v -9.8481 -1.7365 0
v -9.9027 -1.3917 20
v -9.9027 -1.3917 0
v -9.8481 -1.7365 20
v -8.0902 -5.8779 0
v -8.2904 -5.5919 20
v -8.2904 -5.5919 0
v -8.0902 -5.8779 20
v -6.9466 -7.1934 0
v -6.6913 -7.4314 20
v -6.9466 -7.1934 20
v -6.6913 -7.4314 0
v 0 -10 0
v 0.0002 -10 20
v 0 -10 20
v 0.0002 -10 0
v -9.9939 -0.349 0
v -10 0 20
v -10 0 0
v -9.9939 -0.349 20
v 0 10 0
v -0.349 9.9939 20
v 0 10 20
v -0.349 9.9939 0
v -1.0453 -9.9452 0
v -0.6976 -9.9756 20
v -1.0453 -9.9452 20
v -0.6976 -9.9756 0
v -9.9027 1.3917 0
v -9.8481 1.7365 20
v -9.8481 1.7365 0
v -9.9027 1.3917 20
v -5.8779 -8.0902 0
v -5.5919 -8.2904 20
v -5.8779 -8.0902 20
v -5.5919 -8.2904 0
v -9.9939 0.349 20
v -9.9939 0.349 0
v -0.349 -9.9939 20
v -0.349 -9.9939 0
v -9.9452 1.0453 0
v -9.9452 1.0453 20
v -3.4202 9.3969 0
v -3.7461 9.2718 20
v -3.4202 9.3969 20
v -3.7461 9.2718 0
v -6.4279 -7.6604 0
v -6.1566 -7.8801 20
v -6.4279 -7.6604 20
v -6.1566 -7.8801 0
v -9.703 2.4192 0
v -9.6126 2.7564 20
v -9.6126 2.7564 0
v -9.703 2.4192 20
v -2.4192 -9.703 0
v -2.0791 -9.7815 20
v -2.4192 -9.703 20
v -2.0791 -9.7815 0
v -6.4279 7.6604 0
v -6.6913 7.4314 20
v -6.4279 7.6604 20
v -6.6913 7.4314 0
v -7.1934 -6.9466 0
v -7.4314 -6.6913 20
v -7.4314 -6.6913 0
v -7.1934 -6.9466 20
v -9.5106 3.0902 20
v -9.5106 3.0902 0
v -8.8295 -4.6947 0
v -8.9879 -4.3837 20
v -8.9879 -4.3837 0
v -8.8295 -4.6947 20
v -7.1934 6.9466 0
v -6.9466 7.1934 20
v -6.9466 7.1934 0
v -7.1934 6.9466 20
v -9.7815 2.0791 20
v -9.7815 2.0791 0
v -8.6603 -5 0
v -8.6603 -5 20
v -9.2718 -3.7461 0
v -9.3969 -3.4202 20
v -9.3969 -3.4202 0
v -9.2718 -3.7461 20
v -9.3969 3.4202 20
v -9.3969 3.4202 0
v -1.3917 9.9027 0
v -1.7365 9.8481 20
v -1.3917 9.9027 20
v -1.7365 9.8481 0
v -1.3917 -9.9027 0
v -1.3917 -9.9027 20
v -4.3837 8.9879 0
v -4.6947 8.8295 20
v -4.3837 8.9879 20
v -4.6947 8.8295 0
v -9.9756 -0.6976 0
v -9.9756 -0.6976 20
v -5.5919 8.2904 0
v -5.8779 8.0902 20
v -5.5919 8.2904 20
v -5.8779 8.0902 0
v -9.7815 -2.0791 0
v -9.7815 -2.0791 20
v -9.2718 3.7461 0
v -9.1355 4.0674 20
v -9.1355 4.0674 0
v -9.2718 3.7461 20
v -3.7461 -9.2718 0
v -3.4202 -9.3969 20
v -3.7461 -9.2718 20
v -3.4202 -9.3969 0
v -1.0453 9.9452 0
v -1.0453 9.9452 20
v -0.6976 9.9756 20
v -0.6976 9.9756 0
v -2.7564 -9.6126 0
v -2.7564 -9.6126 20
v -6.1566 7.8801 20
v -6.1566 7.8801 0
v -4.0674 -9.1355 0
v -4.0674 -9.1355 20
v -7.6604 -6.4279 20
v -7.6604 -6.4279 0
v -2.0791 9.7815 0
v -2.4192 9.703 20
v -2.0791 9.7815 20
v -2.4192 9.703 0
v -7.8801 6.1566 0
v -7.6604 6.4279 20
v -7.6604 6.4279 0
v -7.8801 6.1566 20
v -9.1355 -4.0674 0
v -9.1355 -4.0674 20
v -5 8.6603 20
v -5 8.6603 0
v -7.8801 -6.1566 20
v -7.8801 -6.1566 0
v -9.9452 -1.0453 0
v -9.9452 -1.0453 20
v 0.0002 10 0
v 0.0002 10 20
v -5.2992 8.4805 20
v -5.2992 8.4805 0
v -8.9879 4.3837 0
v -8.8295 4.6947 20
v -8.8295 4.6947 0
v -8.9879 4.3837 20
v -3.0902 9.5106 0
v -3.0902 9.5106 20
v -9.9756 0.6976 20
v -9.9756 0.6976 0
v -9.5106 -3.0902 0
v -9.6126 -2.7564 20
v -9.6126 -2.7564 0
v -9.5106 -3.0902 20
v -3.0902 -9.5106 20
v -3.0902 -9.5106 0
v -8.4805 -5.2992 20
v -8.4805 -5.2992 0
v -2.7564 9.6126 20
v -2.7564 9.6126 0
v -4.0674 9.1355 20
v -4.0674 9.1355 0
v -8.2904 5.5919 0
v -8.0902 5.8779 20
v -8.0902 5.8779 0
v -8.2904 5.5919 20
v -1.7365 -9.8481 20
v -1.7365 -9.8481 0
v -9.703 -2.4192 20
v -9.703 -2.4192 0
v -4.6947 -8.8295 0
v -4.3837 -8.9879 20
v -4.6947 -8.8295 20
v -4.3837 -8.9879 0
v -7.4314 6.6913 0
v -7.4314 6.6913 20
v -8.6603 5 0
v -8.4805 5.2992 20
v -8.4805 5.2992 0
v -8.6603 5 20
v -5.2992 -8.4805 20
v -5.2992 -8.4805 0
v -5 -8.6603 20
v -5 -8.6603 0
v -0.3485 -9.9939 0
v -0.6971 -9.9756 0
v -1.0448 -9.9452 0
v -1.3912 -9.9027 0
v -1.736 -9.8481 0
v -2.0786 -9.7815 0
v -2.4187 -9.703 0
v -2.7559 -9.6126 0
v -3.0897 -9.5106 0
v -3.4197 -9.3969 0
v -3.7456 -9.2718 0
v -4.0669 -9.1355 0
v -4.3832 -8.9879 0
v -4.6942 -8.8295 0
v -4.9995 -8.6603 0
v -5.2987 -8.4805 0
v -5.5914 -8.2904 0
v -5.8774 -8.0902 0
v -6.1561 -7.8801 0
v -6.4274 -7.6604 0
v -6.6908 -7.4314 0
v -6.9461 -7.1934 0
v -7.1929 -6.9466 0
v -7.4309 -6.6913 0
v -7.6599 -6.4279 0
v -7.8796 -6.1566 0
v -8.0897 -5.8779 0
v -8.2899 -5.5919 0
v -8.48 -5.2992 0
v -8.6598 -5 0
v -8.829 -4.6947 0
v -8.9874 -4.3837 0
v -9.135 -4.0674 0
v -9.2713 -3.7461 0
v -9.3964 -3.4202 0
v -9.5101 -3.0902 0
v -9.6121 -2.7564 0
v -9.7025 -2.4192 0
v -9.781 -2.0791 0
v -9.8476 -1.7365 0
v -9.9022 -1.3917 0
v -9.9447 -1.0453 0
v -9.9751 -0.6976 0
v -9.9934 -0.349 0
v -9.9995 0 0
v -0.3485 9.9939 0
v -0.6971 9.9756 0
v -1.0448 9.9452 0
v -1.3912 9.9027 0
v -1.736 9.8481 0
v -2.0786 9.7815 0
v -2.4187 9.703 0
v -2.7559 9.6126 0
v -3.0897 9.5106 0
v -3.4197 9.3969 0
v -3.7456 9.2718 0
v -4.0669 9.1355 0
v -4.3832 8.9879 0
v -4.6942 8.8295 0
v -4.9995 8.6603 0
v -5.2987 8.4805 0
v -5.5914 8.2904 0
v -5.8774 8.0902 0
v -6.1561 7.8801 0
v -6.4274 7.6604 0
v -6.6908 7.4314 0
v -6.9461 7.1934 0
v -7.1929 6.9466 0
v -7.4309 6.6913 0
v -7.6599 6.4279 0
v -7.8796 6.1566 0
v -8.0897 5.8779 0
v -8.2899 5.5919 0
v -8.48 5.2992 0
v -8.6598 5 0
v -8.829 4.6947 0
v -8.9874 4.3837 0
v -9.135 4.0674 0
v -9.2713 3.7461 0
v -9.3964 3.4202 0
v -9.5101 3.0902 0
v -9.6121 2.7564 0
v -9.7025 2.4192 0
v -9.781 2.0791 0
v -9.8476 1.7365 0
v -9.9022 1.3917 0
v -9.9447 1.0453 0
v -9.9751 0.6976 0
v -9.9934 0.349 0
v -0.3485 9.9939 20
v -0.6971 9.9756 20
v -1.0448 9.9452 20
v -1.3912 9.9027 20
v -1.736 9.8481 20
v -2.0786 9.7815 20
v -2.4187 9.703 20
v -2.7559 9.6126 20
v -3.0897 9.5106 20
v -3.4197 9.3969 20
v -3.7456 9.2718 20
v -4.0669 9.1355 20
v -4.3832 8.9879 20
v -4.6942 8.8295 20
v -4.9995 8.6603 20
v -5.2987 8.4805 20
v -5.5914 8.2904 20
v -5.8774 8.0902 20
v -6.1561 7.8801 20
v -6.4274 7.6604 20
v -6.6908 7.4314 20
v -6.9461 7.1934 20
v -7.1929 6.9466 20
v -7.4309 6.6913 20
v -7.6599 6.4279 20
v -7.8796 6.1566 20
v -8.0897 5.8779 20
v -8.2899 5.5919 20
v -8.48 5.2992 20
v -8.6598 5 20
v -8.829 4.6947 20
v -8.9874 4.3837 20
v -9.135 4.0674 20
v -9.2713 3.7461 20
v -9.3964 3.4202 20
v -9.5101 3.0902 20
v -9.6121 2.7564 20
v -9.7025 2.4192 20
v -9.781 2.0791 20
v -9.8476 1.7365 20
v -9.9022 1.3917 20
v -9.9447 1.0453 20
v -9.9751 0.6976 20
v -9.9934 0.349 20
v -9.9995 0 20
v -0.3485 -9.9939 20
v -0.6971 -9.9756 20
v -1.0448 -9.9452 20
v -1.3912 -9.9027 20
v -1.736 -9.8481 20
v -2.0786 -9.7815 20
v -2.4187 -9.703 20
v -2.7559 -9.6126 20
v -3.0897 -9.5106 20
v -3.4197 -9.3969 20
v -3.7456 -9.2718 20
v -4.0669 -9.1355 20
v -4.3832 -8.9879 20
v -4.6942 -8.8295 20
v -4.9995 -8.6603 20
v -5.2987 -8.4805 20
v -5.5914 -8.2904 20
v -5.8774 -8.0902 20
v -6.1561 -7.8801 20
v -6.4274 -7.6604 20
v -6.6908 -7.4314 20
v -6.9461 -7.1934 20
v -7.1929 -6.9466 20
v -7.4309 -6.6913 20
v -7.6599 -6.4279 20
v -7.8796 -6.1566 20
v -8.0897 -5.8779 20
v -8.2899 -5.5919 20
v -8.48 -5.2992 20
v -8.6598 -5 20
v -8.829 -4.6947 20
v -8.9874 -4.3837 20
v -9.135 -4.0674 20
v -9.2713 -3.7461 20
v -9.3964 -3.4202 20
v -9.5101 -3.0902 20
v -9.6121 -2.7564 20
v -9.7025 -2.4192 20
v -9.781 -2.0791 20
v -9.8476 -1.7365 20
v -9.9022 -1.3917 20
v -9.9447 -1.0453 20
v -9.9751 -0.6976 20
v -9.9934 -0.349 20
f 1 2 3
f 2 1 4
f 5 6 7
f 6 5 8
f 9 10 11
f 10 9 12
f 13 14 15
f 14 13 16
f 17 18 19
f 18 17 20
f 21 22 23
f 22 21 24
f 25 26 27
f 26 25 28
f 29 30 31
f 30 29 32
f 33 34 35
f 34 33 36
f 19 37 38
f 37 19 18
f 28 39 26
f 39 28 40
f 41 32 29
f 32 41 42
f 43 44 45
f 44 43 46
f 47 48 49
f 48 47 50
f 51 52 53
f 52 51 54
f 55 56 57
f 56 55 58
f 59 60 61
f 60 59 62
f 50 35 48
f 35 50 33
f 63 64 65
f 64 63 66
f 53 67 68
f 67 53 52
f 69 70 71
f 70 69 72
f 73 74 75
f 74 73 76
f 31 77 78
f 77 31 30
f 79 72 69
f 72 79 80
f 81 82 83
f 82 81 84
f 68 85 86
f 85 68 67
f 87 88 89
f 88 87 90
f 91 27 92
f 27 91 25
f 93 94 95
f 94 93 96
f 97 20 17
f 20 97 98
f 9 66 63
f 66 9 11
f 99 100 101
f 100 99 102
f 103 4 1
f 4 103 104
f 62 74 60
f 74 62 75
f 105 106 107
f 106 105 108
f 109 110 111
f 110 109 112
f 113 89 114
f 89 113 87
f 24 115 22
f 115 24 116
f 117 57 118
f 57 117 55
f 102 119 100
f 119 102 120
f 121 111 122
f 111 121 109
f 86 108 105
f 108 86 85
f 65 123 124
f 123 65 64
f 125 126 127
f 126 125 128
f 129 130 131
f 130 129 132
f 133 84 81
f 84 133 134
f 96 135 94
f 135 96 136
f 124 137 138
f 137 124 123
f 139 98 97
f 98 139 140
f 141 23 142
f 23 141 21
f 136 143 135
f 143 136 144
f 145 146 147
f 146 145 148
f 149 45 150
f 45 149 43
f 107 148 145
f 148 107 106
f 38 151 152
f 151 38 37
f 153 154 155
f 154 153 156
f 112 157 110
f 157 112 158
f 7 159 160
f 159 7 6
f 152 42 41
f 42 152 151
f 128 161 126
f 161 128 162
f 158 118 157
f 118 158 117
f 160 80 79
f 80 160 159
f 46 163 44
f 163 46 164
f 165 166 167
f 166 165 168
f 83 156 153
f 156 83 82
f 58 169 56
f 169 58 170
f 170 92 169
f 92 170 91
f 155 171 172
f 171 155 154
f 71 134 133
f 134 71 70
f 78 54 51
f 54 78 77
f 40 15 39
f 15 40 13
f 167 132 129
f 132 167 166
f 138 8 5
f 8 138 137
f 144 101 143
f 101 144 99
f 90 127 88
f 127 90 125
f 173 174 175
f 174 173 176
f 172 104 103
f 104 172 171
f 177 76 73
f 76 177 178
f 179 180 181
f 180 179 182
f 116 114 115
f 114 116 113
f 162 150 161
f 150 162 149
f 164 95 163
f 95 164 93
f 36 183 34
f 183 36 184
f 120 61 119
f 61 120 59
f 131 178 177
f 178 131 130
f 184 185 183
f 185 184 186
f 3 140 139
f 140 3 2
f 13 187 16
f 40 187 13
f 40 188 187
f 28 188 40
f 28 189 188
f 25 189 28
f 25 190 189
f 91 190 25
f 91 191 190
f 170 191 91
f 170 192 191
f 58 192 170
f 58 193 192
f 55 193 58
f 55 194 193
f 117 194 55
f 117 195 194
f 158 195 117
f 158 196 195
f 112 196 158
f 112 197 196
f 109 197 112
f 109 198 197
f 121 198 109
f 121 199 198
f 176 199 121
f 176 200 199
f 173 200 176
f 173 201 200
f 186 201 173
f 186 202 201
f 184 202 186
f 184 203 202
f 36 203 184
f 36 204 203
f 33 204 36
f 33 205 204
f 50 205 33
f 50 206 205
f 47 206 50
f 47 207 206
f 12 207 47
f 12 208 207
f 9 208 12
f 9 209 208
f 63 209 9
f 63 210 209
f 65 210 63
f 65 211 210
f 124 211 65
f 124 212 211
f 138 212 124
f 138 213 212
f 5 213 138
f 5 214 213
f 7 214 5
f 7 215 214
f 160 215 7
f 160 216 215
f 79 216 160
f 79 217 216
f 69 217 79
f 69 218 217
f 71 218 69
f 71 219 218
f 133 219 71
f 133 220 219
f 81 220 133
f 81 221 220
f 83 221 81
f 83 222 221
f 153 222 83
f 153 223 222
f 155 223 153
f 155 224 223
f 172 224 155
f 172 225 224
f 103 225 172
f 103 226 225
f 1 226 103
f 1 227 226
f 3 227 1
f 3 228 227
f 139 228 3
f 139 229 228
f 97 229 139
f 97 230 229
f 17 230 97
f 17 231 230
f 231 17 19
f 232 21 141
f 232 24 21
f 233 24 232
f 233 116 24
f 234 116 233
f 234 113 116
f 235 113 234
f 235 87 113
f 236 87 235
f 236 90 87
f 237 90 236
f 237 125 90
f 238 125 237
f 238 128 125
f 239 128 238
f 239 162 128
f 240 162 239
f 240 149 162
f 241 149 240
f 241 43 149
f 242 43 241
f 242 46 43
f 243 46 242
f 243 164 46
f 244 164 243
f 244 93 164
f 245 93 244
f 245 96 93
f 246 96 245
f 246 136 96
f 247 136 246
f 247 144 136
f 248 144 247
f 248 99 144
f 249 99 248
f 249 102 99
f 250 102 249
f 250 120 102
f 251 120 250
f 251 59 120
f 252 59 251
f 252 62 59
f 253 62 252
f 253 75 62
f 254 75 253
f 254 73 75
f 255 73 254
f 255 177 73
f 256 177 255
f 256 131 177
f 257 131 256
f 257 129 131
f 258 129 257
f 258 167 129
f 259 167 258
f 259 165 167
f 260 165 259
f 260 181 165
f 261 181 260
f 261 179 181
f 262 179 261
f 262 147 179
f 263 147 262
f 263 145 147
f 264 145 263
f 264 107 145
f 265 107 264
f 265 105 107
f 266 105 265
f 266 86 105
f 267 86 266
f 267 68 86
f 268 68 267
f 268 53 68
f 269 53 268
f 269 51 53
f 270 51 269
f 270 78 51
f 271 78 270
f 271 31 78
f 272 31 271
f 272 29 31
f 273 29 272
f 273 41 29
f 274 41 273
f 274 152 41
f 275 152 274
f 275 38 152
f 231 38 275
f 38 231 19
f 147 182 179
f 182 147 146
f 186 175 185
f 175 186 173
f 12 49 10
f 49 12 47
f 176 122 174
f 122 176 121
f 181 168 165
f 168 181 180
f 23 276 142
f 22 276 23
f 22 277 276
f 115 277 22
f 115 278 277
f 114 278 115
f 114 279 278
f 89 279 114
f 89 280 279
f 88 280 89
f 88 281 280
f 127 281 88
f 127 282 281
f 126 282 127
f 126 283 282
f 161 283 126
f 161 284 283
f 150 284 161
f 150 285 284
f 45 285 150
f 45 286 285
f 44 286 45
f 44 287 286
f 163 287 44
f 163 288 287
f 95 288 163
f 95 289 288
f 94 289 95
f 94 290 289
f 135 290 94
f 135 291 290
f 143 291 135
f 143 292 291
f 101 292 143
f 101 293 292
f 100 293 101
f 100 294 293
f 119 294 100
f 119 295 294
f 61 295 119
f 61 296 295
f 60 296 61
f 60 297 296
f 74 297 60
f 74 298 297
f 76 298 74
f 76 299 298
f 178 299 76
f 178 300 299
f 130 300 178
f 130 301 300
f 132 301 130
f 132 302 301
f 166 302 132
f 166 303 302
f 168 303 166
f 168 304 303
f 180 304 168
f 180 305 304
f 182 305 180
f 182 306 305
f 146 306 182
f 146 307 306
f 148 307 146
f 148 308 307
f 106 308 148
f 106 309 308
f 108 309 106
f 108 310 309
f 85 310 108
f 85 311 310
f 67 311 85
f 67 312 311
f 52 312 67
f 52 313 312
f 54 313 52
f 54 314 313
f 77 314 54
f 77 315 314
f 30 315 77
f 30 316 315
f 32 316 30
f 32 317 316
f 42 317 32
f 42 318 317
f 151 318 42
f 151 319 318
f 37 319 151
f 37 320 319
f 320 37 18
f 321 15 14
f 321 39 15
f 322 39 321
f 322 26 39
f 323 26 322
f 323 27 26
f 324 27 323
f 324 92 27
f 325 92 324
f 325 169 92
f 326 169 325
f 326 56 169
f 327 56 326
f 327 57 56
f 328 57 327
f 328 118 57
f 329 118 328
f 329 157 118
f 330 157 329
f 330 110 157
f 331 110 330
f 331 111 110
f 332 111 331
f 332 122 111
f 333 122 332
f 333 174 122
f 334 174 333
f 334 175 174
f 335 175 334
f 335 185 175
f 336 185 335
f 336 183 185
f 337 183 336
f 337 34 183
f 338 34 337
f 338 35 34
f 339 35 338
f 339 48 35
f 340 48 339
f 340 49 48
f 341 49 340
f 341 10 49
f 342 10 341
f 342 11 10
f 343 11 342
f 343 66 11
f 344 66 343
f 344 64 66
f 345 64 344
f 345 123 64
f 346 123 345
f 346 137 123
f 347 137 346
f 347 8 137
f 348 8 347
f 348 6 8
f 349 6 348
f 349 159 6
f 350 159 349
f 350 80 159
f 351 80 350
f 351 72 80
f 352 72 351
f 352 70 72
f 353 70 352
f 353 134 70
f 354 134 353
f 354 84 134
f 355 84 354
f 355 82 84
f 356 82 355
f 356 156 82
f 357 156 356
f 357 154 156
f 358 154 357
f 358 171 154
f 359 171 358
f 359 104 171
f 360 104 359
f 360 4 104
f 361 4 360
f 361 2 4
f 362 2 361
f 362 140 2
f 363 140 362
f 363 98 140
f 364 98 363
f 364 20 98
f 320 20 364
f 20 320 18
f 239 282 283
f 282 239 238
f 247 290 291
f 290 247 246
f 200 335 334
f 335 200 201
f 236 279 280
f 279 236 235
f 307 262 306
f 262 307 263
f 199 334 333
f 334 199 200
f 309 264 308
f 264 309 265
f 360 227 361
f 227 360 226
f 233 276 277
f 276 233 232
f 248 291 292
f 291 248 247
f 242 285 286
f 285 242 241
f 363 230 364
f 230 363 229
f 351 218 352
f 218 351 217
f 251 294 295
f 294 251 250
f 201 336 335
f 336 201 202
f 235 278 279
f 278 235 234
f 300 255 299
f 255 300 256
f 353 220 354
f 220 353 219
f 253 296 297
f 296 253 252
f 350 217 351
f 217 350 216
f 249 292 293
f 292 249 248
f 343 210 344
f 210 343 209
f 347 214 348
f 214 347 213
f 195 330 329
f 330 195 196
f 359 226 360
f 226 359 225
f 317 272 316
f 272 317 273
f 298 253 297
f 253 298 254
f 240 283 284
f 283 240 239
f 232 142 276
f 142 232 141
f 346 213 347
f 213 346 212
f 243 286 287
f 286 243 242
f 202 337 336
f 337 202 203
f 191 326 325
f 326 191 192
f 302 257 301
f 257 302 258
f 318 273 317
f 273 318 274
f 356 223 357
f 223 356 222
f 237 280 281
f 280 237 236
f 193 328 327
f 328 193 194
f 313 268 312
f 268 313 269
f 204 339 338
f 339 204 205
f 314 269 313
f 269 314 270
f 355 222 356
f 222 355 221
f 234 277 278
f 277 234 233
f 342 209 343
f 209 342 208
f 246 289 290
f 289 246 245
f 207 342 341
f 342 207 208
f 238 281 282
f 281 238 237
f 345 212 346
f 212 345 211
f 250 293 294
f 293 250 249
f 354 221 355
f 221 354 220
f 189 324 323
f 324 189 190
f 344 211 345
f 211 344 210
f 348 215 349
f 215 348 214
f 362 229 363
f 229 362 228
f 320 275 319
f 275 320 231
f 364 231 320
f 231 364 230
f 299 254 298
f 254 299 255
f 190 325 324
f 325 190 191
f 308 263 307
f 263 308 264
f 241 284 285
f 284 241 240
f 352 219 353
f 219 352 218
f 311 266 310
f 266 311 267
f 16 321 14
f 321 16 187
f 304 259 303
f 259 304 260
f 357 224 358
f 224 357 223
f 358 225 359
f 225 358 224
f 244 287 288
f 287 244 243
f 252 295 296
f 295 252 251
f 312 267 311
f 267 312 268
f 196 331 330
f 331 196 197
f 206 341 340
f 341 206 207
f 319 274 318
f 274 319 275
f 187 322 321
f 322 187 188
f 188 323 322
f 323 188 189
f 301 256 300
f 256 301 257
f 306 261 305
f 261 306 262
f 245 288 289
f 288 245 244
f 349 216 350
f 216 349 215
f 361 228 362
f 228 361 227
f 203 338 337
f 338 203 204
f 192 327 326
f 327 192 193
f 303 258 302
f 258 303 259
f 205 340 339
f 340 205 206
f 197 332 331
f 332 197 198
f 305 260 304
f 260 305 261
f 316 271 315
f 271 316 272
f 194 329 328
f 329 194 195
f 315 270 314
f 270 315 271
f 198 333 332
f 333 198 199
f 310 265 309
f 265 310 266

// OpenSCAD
// A near-tangent boolean leaves a sub-micron edge, and that sliver silently
// poisons every ray-based measurement taken on the mesh afterwards.
//
// Reproduction of a real part (server_rack_modular/scad/parts/frame_module.scad,
// measured 2026-09-12): watertight, ONE connected body, every volume-based
// check clean -- and a shortest edge of 0.000028 mm. check_printability.py read
// a "0.014 mm wall" off it and reported FAIL, 30x below anything the model
// declares. The same run on base.stl (healthy mesh, shortest edge 0.296 mm)
// reads a min wall of 0.252 mm, which matches its geometry.
//
// The 0.0005 mm offset below is what makes the difference: the cutter is
// effectively tangent, so the boolean leaves a crescent a fraction of a micron
// wide instead of a clean wall. Nothing looks wrong in the render.

$fa = 2; $fs = 0.3;

difference() {
    cylinder(r = 10, h = 20, $fn = 180);
    translate([0.0005, 0, 0]) cylinder(r = 10, h = 25, $fn = 180);
}
